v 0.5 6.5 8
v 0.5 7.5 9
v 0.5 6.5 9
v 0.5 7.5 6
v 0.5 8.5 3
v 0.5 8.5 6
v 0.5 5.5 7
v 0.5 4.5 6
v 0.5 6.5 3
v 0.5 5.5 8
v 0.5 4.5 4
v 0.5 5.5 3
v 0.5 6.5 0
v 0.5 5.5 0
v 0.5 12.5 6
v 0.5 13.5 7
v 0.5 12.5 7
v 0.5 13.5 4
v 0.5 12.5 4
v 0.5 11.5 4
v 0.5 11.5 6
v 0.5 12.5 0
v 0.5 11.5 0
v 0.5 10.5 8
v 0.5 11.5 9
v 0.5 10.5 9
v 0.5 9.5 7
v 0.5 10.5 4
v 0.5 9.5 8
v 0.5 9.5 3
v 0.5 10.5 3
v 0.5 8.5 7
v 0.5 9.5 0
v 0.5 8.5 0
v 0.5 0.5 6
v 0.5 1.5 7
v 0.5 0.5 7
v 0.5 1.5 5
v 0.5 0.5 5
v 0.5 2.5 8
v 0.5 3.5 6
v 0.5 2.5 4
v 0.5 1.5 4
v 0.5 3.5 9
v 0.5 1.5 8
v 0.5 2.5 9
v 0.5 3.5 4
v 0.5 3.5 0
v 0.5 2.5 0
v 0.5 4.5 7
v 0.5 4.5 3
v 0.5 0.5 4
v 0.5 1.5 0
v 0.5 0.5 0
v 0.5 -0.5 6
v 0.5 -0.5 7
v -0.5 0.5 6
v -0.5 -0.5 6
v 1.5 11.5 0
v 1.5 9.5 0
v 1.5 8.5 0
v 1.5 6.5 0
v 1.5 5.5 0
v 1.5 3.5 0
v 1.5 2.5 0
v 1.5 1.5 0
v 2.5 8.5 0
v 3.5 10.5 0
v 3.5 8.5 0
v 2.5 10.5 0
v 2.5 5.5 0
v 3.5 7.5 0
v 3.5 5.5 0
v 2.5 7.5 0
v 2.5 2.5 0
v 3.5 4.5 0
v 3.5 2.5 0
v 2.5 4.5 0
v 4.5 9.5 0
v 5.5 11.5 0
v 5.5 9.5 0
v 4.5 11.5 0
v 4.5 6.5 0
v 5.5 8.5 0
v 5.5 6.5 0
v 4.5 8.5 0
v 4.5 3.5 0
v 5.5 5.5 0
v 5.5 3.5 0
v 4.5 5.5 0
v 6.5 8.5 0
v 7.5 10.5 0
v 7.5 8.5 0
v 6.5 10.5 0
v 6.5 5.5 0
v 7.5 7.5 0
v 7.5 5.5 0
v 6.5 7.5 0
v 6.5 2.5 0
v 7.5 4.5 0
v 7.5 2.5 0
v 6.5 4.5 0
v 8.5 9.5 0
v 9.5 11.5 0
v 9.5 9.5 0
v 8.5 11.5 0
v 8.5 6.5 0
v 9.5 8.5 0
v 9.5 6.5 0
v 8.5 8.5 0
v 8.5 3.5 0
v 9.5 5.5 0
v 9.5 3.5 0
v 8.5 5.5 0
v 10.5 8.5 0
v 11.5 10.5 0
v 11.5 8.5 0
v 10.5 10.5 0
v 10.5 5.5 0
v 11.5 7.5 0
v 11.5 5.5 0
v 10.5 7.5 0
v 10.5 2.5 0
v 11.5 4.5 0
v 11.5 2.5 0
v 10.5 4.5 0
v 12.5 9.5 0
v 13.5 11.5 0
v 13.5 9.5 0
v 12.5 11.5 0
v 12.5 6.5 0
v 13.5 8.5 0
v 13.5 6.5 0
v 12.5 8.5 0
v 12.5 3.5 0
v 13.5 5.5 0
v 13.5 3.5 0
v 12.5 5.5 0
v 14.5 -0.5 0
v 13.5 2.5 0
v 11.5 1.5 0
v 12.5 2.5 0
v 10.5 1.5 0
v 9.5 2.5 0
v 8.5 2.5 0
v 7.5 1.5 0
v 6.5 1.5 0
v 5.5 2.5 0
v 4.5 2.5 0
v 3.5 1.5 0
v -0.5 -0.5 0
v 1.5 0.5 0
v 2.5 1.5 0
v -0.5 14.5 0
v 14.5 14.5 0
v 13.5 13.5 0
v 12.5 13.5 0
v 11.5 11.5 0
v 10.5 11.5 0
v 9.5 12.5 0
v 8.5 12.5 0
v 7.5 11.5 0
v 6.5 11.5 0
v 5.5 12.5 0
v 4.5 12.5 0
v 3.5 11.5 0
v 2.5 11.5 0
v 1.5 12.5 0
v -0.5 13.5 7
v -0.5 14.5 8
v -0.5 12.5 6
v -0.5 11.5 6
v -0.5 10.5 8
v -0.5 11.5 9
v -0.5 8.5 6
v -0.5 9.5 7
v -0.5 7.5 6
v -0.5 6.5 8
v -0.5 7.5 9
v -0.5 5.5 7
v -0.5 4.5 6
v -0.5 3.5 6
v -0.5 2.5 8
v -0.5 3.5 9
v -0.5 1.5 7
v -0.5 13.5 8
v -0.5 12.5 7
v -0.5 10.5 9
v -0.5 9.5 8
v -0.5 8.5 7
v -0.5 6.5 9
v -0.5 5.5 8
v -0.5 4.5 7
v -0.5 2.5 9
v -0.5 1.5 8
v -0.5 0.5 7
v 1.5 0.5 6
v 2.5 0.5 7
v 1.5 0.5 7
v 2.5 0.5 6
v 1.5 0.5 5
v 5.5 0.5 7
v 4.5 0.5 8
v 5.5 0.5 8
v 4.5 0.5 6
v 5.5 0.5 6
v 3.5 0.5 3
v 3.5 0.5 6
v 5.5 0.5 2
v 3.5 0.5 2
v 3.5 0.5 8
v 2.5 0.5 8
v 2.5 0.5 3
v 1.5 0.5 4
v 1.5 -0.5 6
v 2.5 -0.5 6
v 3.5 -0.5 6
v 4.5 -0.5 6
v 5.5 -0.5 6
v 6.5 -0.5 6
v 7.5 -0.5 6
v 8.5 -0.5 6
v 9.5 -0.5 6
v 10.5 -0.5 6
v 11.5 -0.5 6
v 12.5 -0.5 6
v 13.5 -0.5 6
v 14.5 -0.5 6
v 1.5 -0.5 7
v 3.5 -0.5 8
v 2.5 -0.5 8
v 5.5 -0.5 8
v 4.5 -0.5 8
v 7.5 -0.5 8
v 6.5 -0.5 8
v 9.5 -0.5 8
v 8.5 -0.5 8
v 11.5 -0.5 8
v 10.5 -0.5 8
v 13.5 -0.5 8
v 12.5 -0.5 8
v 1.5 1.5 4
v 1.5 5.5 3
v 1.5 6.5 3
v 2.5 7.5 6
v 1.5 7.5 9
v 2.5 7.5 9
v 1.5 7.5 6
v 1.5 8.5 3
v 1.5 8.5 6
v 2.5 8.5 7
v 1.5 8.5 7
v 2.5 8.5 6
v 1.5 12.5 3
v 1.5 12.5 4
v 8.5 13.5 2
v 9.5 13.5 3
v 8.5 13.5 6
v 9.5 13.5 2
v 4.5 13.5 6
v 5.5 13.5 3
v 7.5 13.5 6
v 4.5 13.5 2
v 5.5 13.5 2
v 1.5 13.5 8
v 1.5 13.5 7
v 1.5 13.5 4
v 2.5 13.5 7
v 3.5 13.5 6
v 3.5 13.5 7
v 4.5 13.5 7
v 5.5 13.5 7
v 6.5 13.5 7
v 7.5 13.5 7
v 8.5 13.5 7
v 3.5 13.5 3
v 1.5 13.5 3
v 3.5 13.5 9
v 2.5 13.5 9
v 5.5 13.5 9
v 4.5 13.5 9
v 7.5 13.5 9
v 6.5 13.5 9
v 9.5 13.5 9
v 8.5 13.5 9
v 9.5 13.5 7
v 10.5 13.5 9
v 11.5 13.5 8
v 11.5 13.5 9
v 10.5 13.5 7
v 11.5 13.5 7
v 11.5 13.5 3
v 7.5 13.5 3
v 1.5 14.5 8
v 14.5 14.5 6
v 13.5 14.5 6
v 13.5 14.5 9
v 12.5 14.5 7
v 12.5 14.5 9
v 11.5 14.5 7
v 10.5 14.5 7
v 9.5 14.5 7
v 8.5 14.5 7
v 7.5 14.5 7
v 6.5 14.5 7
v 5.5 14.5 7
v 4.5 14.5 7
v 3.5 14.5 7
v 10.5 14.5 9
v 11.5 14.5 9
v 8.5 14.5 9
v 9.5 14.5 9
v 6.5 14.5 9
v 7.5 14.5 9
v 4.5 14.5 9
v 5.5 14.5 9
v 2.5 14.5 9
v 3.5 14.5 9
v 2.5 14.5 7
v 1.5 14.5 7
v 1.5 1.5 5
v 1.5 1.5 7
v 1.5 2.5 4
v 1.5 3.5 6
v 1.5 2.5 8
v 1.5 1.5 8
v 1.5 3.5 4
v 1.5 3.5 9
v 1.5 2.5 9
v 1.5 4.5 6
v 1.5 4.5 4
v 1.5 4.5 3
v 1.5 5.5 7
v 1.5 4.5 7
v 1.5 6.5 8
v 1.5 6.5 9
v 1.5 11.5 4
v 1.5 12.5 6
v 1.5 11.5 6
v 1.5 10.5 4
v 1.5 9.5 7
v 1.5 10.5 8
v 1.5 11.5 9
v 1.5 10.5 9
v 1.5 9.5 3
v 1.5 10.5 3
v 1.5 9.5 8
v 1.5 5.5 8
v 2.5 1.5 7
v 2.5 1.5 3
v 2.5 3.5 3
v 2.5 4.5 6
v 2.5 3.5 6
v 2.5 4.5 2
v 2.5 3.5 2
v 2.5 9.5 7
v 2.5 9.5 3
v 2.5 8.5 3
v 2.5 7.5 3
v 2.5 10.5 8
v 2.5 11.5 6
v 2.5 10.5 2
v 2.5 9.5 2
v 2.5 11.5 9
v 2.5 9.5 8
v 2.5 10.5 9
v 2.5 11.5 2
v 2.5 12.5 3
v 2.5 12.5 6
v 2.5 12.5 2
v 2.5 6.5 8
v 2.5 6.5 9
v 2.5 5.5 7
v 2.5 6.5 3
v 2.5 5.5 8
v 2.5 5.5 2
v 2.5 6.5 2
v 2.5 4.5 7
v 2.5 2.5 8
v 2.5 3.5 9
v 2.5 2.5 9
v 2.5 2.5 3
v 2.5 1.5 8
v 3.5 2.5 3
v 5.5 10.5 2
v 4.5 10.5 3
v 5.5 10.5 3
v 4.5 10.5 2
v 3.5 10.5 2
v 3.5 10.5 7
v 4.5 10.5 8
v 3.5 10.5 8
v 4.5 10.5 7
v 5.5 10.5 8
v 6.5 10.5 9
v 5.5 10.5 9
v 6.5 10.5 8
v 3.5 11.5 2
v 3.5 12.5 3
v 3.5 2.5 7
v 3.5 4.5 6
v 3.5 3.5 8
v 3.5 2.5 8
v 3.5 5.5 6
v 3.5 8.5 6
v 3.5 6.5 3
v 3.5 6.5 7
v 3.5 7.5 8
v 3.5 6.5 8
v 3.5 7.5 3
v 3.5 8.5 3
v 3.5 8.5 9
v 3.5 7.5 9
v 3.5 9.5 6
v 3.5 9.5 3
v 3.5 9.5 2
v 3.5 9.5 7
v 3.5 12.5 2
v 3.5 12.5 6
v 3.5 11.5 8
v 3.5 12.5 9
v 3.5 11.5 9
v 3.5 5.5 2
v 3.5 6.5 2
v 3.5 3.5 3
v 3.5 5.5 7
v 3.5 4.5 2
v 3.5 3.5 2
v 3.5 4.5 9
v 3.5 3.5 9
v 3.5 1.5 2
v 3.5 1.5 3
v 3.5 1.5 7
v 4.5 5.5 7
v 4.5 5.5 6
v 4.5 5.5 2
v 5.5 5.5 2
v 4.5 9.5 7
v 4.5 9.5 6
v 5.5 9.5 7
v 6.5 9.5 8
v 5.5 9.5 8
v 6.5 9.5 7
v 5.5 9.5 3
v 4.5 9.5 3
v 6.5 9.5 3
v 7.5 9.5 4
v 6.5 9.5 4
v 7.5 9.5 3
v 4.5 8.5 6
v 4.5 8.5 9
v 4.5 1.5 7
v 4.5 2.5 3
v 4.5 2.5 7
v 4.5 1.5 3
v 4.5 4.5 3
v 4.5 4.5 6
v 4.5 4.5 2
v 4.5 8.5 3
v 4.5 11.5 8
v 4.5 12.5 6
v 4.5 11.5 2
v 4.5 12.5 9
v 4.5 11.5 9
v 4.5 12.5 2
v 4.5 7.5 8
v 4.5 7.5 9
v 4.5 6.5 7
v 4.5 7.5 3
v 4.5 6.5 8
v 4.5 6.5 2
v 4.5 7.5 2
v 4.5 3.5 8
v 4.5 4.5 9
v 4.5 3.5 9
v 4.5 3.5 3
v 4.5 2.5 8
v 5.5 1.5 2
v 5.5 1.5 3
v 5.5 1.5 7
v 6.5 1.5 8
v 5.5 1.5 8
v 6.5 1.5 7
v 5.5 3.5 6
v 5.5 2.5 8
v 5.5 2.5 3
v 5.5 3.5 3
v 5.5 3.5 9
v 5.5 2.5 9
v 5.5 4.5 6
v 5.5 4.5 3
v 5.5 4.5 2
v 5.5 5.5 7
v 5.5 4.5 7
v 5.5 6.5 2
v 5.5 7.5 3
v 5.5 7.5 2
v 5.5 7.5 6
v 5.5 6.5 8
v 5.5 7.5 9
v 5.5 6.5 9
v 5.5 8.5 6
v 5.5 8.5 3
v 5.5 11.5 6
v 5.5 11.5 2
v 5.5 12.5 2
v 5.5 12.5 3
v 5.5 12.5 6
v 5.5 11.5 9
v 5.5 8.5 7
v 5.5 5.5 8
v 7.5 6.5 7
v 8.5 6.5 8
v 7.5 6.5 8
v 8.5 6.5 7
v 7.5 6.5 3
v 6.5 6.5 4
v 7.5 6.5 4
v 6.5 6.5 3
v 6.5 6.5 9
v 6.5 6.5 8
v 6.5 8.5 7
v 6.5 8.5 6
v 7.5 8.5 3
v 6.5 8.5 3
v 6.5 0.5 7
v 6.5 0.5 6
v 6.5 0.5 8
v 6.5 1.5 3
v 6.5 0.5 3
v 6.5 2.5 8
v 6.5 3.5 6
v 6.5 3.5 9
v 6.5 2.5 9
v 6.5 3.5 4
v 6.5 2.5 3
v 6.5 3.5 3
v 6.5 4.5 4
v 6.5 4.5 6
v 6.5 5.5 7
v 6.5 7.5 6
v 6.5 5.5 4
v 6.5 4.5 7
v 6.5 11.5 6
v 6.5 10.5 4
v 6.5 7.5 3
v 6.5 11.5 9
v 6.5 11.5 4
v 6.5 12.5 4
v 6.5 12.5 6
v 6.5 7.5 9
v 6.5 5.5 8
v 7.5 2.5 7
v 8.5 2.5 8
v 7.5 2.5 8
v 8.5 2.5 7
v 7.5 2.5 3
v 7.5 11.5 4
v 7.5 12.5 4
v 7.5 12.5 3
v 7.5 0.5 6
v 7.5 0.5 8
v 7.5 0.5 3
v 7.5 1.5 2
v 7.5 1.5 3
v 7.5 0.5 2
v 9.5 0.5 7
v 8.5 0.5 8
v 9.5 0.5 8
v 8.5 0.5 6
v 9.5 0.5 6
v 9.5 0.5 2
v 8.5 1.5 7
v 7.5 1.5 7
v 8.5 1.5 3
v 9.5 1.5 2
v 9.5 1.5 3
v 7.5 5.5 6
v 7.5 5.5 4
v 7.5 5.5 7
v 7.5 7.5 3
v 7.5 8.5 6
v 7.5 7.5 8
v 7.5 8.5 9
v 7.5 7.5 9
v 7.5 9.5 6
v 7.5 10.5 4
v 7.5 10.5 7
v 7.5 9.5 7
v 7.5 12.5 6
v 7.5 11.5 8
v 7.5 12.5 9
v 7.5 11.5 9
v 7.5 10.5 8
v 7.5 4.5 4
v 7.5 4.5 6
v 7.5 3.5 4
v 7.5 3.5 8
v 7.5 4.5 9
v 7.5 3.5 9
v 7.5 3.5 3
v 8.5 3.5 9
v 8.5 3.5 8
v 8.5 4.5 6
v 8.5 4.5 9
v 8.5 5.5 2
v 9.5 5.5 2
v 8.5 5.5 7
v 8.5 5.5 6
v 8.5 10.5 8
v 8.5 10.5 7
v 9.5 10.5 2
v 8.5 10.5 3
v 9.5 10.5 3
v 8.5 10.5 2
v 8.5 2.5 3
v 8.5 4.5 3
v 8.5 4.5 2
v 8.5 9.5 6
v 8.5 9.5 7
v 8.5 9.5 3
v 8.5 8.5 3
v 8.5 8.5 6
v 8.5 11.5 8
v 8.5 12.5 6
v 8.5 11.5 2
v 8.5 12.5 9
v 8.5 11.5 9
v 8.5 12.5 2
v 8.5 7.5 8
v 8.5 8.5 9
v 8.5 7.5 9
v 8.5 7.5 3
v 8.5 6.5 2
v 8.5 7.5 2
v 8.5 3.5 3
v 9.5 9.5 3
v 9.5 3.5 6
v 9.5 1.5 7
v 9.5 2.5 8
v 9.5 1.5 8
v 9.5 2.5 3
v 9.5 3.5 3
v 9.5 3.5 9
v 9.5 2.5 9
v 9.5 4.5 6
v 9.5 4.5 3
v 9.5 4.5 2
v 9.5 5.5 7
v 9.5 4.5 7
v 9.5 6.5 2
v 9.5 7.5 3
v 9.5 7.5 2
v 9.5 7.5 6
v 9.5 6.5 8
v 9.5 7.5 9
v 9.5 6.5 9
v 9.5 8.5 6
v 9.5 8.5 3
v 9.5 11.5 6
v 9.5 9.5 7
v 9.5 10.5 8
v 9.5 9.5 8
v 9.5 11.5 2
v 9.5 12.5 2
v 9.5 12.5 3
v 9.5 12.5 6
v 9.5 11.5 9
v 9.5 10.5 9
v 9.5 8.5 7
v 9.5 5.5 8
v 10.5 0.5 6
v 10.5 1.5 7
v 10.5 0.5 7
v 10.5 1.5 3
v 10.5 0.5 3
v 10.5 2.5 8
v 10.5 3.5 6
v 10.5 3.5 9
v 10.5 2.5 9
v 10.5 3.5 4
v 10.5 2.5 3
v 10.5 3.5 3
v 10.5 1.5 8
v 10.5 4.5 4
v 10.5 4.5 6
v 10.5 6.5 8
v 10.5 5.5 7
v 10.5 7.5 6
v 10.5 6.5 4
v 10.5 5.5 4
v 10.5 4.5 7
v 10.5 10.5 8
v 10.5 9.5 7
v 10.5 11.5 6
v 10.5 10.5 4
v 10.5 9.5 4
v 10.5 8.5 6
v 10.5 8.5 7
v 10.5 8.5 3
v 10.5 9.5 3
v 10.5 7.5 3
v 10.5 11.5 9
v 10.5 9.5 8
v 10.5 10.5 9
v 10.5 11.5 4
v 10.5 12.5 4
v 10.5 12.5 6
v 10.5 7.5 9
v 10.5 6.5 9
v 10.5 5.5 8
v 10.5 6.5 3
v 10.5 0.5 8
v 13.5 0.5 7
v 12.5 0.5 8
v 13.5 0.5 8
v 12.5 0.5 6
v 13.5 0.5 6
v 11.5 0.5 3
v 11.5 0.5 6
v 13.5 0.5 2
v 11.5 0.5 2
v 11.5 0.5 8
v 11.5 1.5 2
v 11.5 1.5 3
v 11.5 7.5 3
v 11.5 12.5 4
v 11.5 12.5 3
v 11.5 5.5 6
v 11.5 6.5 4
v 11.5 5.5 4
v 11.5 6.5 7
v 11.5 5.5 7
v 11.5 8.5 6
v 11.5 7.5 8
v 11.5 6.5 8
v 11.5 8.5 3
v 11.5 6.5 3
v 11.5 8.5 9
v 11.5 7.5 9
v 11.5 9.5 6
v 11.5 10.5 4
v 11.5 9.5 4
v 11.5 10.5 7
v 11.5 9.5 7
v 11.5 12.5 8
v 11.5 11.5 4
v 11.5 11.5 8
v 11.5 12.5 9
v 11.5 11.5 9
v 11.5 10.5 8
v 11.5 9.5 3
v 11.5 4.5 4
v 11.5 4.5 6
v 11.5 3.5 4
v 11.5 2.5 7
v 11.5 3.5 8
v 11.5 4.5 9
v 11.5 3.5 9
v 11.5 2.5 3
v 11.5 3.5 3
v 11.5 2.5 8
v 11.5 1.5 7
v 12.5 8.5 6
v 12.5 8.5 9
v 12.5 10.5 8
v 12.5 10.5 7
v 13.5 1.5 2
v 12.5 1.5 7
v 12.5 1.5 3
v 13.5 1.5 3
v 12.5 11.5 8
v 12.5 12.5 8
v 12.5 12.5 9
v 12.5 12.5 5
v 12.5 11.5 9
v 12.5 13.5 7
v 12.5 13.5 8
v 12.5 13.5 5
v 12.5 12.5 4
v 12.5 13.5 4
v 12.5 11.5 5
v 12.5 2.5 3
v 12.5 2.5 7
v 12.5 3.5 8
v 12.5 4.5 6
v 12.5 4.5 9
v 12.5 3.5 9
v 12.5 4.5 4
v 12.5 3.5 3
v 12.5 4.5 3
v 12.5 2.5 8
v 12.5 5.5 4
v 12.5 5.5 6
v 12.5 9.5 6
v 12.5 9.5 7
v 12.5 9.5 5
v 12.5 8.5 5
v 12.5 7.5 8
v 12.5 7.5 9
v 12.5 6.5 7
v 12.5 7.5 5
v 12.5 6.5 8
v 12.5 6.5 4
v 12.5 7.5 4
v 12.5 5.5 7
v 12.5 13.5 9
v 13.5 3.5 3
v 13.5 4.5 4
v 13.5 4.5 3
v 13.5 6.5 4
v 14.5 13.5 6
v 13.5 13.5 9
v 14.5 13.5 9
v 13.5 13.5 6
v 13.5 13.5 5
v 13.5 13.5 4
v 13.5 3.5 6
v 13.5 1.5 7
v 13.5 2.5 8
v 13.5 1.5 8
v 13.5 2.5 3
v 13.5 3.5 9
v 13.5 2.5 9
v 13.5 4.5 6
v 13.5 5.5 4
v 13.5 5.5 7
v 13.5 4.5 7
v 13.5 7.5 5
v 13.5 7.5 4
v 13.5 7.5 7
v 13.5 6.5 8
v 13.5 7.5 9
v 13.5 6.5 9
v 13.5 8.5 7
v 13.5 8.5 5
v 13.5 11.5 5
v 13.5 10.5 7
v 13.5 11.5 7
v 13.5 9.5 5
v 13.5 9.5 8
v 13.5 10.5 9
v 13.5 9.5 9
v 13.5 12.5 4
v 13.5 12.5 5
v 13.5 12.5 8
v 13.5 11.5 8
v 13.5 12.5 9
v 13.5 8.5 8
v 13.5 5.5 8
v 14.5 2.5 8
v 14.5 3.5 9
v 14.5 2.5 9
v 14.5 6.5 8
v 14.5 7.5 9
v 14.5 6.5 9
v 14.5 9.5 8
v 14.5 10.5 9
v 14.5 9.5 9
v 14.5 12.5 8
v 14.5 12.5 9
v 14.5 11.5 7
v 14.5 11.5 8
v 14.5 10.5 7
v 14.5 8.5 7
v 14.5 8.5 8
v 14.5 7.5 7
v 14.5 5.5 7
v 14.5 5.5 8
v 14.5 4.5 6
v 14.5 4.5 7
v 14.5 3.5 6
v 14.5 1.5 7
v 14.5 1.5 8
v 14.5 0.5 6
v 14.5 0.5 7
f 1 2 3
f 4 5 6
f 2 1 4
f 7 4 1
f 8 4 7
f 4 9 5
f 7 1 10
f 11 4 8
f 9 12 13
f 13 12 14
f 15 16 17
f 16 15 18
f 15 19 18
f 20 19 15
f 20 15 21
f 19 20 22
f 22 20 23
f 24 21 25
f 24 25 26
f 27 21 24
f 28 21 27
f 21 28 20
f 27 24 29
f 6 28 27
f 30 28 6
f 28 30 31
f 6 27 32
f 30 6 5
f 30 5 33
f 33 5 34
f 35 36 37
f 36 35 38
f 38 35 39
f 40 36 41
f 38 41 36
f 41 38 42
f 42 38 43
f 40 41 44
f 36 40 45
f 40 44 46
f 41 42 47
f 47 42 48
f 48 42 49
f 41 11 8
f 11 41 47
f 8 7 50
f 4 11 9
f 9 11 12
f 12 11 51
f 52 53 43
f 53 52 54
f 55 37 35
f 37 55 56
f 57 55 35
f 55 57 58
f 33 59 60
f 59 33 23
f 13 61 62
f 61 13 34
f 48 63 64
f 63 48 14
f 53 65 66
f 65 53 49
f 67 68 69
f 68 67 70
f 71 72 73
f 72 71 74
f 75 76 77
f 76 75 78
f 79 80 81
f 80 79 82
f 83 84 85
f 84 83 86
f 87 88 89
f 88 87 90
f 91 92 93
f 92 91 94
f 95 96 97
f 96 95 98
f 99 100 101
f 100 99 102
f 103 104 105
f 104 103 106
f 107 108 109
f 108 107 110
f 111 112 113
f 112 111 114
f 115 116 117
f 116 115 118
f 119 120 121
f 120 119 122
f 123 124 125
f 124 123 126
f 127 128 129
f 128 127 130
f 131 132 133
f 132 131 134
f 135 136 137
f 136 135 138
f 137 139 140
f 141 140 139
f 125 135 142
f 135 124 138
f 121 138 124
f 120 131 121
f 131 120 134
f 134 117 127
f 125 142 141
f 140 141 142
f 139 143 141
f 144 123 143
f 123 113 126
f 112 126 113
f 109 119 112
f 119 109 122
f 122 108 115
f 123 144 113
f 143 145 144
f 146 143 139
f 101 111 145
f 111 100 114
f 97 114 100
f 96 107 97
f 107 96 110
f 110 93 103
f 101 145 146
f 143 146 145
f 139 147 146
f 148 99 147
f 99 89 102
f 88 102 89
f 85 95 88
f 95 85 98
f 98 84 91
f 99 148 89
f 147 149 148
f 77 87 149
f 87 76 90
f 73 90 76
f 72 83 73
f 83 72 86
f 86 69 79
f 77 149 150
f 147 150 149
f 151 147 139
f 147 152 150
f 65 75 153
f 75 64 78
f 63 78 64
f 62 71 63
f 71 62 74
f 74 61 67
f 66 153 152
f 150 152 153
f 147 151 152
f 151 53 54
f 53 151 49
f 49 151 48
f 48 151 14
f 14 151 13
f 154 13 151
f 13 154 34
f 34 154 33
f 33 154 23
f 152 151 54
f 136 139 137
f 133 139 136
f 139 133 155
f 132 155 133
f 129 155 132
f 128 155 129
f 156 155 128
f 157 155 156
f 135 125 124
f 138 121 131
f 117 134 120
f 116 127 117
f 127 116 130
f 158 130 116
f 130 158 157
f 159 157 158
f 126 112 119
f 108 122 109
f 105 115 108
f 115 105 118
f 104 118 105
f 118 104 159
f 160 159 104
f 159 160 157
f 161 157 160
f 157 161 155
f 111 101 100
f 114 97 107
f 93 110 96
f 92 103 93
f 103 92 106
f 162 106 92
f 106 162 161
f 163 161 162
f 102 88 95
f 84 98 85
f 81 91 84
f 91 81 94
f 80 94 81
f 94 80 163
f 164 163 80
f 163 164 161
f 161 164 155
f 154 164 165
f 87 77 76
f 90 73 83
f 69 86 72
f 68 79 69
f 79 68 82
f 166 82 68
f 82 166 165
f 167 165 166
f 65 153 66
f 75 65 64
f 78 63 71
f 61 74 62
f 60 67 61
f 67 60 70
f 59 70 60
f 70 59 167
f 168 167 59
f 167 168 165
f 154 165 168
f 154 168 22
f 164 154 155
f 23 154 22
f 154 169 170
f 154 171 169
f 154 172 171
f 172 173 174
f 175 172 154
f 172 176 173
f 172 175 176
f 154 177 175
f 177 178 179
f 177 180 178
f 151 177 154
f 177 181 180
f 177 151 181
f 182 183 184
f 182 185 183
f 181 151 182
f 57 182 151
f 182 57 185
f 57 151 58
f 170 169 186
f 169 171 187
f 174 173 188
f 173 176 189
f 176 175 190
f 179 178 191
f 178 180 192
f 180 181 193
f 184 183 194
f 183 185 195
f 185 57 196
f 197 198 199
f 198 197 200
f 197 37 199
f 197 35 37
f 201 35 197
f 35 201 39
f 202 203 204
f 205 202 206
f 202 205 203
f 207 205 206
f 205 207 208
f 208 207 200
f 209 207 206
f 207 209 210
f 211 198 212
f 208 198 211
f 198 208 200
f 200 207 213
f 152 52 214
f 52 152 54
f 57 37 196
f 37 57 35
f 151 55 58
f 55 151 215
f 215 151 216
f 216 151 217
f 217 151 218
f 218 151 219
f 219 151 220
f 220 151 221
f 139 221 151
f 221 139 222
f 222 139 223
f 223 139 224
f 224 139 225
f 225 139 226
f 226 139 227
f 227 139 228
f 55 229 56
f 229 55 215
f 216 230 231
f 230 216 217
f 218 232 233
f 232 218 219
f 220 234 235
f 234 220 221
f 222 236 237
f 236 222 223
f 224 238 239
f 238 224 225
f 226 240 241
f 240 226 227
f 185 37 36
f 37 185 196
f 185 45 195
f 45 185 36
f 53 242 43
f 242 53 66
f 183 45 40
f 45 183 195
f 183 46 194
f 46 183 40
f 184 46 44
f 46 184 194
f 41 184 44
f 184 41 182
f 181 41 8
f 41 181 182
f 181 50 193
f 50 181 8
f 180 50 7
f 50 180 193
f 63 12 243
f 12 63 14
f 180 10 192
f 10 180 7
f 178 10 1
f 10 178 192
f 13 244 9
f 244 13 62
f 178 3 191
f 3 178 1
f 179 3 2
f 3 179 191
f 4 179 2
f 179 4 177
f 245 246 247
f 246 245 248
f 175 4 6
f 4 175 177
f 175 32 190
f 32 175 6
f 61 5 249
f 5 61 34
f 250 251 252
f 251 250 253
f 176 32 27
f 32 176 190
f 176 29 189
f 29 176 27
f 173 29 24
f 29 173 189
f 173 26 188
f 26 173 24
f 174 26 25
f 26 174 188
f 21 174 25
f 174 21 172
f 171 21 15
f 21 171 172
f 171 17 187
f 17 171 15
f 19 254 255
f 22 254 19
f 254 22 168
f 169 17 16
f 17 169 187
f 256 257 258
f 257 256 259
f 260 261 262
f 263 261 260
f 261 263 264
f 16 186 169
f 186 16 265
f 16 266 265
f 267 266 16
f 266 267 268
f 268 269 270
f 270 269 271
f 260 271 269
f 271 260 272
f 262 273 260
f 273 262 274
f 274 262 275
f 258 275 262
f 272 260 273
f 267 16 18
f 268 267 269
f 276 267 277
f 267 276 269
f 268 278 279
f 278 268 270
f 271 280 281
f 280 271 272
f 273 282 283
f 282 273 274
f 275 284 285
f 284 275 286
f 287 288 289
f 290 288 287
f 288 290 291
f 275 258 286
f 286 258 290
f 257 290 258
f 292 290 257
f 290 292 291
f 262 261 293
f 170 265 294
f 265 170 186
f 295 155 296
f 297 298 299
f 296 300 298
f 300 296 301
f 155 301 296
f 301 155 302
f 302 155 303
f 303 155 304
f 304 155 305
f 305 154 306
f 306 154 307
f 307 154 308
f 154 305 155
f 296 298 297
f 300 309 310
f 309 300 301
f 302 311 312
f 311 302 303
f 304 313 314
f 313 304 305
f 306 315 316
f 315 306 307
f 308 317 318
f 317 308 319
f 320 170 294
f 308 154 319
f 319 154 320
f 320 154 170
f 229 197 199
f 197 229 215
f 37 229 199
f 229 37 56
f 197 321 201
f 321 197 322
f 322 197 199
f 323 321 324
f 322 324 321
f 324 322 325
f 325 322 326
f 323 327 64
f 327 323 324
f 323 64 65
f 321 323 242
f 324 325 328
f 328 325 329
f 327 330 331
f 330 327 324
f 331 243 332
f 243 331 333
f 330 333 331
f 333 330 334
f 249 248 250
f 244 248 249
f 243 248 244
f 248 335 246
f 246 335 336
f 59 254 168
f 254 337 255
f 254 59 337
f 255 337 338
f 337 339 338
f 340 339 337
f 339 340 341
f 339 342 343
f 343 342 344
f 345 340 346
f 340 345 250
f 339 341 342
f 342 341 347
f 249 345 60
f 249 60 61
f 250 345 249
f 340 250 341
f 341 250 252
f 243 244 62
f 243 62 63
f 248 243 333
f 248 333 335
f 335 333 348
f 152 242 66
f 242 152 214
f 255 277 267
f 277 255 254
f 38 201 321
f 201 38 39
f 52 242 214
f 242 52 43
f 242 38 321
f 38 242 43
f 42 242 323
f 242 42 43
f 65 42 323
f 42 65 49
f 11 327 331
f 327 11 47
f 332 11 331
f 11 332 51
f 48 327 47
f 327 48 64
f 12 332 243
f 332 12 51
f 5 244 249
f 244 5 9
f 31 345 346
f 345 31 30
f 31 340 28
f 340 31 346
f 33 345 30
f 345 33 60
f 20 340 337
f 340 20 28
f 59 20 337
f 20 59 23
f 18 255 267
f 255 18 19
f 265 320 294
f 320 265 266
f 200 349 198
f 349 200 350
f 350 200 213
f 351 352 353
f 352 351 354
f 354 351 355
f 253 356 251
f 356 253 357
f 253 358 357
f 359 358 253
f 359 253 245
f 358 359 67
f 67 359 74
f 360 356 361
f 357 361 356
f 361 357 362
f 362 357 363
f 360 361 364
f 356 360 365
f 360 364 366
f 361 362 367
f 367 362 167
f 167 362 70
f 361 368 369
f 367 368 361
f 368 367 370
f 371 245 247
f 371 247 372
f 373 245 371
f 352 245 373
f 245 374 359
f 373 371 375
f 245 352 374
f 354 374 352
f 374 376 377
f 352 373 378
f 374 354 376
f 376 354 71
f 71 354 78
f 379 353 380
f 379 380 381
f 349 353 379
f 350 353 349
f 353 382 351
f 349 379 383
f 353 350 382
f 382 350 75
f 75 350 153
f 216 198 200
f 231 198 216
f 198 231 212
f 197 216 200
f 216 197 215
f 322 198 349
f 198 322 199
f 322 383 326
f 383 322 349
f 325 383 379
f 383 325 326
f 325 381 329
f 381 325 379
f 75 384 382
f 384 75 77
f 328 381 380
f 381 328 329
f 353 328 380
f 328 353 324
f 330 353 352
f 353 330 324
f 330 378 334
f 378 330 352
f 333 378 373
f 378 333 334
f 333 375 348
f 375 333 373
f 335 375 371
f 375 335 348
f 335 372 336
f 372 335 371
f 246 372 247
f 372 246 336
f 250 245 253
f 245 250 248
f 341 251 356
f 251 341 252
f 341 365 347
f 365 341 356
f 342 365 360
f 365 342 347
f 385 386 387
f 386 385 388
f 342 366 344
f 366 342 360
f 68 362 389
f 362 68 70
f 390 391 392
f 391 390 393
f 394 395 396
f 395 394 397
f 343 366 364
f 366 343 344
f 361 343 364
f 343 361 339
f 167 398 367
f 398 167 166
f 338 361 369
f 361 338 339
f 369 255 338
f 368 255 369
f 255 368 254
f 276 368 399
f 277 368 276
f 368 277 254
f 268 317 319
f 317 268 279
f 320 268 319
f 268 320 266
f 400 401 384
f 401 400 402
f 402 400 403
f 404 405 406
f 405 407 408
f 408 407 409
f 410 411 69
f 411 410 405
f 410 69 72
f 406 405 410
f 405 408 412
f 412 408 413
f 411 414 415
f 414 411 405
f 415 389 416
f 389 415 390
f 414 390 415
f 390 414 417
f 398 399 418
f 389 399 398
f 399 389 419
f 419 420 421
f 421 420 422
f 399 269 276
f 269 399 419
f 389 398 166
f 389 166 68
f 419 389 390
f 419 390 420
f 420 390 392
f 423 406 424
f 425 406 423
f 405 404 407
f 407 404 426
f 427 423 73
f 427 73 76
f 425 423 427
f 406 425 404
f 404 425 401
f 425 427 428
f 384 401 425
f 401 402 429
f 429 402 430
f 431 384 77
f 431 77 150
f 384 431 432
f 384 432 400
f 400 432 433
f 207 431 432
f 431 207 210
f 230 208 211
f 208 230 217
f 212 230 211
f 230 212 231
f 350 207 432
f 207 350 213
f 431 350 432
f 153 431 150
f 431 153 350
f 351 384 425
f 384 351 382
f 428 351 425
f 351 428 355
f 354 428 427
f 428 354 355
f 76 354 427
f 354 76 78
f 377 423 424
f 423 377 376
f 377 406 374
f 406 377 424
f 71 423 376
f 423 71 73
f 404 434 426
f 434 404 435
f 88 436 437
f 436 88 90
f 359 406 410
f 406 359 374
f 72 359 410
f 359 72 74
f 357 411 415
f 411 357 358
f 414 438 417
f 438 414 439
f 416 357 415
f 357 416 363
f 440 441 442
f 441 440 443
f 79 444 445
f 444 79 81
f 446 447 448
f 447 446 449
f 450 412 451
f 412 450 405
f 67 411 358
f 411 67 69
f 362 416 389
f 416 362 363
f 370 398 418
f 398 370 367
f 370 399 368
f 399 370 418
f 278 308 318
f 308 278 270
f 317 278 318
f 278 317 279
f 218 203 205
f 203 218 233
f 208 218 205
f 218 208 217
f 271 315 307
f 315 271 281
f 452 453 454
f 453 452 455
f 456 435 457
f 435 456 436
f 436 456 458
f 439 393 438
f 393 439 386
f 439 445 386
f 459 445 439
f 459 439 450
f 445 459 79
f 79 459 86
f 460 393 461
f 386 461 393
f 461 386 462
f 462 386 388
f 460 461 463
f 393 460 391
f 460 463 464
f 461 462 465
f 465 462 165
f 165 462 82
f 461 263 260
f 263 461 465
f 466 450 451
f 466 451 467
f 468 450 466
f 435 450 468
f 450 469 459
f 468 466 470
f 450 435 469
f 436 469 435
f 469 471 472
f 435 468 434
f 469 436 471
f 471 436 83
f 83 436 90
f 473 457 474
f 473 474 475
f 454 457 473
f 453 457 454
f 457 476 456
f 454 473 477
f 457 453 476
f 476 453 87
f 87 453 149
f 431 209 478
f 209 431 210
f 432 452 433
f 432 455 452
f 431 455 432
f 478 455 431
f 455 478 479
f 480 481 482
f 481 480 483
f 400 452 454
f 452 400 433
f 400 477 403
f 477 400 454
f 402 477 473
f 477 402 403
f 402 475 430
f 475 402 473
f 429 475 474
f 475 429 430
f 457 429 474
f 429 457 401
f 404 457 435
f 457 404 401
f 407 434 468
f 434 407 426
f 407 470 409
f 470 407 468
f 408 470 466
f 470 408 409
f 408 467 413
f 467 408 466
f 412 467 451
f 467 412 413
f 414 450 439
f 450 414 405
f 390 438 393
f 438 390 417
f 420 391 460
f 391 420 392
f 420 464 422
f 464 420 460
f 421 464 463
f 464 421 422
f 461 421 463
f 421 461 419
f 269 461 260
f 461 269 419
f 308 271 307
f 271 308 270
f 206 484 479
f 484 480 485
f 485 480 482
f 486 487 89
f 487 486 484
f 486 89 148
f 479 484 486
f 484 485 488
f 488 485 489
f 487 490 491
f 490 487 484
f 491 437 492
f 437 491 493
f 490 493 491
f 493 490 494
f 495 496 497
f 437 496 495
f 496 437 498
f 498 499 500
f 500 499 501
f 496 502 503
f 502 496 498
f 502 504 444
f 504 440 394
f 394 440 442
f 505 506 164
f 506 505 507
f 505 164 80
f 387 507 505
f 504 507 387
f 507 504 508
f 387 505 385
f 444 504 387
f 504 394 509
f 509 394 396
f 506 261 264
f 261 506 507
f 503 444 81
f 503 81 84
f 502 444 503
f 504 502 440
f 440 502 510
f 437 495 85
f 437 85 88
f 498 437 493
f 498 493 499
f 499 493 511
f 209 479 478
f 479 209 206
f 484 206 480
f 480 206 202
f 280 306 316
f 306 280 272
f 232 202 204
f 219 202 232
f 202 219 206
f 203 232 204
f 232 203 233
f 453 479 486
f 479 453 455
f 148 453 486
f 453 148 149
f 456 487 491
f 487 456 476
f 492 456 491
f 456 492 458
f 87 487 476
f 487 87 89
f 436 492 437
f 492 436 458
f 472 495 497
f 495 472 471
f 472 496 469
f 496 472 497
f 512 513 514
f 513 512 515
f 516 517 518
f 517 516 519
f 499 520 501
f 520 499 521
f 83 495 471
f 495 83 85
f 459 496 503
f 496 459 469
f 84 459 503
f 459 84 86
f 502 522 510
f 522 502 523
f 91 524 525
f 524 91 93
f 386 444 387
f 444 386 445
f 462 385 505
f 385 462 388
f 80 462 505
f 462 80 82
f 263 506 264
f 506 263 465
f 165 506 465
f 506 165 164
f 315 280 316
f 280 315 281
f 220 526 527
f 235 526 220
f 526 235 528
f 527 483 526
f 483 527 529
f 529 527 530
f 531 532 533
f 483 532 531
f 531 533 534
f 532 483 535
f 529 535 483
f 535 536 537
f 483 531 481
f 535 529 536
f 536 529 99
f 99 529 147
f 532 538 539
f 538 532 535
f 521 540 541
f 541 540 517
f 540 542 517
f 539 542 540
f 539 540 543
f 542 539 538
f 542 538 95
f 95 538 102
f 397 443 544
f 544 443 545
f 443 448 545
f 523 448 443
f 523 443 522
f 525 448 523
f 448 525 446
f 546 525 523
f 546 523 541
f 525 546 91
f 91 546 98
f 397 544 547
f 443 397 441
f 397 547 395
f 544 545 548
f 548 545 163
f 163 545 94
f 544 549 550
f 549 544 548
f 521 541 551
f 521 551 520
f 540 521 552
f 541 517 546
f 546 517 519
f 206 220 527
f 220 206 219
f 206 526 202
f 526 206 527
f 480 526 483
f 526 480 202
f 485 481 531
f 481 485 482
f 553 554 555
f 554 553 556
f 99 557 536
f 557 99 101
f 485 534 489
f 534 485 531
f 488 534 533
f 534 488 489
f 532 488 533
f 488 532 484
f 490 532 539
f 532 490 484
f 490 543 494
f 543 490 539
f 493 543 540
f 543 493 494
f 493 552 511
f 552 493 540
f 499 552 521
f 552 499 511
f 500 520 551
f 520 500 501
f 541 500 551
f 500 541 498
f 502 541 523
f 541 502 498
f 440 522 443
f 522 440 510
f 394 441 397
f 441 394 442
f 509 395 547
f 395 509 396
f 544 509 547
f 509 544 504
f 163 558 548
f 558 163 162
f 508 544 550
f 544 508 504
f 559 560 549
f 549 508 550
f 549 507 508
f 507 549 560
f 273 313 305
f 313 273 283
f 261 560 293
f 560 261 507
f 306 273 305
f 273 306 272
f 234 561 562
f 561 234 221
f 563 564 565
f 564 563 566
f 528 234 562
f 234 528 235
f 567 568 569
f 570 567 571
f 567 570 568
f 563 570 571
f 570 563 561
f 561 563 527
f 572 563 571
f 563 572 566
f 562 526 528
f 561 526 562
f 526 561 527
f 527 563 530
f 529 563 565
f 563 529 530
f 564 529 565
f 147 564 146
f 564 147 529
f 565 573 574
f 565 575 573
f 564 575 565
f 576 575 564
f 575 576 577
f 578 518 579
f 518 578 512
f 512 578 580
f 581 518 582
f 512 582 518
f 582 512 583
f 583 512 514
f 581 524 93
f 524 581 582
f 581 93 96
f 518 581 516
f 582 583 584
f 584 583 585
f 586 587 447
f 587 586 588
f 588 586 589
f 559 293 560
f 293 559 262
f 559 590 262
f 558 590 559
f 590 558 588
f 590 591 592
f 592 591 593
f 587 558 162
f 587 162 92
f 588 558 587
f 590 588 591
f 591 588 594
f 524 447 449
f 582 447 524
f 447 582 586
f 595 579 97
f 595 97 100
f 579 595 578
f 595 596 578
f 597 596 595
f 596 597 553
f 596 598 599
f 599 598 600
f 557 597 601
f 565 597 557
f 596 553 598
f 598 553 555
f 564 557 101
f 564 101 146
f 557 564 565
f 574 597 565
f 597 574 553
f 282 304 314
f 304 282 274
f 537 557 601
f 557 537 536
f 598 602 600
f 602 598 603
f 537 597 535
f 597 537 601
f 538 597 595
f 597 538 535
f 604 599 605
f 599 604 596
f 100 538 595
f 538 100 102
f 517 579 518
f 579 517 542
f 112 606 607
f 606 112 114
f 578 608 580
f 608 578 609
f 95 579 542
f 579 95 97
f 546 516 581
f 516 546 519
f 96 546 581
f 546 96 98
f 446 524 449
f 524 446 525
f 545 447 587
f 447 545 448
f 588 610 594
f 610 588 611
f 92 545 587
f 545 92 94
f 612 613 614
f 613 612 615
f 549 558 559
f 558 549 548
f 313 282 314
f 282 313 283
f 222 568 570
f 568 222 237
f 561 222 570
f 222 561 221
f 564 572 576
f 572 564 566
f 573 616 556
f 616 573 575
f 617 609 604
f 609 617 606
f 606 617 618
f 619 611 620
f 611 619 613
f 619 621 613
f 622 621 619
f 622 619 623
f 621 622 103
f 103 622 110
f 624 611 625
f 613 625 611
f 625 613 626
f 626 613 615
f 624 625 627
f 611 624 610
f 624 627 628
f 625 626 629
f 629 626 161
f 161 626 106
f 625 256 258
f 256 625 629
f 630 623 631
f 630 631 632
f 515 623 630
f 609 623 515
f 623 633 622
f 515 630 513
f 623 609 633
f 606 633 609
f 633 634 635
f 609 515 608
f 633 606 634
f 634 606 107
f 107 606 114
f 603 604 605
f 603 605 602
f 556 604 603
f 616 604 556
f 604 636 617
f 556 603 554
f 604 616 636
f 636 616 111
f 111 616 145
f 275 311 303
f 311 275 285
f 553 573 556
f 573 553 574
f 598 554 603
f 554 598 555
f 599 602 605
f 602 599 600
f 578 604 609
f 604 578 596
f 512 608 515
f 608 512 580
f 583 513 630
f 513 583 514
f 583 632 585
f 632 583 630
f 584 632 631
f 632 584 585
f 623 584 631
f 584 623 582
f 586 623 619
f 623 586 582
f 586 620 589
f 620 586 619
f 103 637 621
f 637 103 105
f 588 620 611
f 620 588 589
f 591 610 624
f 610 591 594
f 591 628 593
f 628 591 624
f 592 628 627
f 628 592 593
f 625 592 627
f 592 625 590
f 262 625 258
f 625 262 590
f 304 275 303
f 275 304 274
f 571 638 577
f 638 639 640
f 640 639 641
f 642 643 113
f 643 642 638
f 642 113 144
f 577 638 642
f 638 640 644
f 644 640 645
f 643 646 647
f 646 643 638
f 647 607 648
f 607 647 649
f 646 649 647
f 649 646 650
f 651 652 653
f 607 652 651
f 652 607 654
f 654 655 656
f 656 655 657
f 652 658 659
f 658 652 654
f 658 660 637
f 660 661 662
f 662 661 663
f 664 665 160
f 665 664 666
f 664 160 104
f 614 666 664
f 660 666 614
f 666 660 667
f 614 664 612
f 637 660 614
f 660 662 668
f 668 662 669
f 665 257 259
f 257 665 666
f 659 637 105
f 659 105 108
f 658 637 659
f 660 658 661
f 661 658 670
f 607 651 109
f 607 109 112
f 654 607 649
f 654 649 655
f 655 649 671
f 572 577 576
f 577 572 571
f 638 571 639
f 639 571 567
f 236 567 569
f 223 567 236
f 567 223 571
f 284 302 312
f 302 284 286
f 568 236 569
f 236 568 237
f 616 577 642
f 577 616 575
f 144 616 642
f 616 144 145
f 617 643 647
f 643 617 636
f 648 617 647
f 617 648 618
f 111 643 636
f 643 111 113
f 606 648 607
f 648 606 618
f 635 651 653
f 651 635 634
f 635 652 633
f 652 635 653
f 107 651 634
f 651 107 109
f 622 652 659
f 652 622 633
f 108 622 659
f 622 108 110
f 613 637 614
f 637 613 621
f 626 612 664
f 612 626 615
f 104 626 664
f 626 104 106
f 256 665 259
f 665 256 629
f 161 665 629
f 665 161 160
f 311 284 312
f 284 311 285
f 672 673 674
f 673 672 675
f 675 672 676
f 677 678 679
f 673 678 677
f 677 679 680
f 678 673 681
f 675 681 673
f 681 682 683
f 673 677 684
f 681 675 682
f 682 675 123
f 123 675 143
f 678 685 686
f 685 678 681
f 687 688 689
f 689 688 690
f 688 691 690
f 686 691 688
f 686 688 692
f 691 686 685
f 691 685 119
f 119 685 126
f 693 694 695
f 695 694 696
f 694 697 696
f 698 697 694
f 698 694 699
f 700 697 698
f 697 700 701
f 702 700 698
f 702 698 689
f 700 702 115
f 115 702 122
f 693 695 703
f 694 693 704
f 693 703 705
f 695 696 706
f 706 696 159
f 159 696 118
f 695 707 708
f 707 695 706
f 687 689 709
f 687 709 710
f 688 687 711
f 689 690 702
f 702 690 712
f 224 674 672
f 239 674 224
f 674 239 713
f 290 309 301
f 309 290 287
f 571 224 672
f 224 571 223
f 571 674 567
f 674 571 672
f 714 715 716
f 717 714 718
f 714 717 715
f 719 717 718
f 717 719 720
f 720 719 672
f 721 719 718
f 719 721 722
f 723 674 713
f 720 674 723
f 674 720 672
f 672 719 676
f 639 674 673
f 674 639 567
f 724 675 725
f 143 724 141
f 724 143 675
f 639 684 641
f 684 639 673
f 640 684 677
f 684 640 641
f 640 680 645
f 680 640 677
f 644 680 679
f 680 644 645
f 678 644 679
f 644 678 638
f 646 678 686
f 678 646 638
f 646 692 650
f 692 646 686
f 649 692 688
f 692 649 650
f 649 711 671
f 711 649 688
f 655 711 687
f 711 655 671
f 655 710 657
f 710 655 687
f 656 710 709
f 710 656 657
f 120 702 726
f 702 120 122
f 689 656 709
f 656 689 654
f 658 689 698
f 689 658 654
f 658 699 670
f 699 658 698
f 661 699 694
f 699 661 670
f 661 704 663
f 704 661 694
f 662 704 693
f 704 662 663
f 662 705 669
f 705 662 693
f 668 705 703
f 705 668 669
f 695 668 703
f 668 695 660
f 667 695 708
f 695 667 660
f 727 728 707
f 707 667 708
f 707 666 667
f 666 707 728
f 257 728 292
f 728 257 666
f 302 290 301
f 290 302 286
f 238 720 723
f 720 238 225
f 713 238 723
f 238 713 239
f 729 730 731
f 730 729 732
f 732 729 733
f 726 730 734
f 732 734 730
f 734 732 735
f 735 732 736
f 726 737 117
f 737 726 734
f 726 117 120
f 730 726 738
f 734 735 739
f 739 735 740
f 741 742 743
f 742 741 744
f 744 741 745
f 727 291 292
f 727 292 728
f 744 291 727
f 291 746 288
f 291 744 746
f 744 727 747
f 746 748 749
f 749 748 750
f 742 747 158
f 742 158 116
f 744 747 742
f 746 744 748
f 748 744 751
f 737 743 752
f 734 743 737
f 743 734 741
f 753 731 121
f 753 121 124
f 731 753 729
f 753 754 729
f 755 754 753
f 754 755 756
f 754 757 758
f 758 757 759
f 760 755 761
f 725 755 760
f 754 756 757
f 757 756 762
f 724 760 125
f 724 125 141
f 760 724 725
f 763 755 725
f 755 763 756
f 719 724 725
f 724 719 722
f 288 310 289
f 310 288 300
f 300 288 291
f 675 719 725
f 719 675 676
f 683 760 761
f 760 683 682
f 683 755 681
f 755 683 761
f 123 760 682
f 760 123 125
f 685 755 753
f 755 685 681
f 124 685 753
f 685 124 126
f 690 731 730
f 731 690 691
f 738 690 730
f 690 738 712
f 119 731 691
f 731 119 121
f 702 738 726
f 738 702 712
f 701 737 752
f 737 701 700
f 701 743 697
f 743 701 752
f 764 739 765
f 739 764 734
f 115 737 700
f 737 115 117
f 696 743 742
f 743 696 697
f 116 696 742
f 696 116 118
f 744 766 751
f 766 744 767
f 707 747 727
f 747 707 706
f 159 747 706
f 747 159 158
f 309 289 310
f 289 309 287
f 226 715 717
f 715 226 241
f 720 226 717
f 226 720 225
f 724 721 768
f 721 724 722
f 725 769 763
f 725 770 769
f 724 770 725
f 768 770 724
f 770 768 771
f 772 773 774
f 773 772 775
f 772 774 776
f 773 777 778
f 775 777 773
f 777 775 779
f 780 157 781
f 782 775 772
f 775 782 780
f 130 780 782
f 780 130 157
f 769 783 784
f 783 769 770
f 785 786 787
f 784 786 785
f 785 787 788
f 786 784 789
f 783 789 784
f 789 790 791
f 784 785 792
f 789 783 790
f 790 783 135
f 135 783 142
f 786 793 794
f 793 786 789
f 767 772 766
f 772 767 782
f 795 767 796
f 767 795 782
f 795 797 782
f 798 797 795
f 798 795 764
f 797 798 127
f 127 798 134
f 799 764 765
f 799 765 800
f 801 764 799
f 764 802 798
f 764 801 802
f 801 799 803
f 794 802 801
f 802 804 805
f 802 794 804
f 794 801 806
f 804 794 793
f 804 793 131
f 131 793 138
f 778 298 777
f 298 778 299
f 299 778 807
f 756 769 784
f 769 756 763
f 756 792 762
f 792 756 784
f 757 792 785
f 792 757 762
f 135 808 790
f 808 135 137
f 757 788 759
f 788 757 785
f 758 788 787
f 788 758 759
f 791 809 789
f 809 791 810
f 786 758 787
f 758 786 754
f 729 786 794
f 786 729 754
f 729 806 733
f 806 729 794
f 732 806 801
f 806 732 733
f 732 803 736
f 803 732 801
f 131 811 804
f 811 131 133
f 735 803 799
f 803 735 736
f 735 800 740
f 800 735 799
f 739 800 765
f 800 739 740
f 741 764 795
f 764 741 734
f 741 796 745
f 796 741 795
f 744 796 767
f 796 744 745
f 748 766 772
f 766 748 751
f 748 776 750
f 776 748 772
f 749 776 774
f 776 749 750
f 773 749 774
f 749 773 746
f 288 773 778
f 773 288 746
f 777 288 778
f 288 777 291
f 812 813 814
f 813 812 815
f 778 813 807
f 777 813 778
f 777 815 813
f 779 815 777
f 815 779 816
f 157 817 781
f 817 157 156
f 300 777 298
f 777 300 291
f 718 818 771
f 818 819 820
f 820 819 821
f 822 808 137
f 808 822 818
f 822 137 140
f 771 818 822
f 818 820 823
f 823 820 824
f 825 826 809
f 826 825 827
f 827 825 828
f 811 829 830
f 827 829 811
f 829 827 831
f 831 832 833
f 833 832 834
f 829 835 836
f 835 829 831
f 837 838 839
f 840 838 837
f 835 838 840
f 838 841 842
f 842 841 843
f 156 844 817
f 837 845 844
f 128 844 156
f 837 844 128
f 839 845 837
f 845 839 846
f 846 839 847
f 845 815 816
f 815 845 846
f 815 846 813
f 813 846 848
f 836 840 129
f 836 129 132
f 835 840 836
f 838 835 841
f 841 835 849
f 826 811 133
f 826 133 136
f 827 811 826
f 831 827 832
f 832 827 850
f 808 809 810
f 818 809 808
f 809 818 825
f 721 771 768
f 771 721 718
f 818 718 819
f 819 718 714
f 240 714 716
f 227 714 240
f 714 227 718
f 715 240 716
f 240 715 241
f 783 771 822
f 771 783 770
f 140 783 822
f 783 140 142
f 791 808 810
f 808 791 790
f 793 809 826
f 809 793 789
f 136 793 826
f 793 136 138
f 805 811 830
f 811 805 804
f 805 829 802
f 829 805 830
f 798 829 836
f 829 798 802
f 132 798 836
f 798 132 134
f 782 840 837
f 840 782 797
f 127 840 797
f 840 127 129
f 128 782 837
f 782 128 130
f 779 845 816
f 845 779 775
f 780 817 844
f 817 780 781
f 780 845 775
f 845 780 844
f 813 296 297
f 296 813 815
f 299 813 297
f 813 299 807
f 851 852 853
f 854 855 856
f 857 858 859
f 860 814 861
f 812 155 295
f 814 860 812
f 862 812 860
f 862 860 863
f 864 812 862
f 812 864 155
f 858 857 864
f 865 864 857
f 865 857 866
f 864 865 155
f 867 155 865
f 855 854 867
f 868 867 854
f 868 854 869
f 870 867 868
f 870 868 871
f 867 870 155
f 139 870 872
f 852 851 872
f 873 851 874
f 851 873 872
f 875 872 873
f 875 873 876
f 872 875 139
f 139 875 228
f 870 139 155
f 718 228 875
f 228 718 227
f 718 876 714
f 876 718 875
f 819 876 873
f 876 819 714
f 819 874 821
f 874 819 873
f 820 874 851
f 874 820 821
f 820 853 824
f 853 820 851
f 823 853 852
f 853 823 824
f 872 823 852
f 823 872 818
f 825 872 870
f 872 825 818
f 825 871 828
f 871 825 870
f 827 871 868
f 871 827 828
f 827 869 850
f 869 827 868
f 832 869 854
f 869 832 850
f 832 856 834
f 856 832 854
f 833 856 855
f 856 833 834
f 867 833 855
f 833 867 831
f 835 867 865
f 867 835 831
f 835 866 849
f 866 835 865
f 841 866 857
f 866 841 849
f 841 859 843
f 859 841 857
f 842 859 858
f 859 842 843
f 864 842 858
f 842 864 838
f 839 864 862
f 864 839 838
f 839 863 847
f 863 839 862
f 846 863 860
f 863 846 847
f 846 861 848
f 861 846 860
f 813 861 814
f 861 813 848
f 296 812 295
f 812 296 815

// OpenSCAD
union() {
    translate([0, 0, 3.0]) cube([1, 1, 6], center=true);
    translate([0, 1, 3.5]) cube([1, 1, 7], center=true);
    translate([0, 2, 4.0]) cube([1, 1, 8], center=true);
    translate([0, 3, 4.5]) cube([1, 1, 9], center=true);
    translate([0, 4, 3.0]) cube([1, 1, 6], center=true);
    translate([0, 5, 3.5]) cube([1, 1, 7], center=true);
    translate([0, 6, 4.0]) cube([1, 1, 8], center=true);
    translate([0, 7, 4.5]) cube([1, 1, 9], center=true);
    translate([0, 8, 3.0]) cube([1, 1, 6], center=true);
    translate([0, 9, 3.5]) cube([1, 1, 7], center=true);
    translate([0, 10, 4.0]) cube([1, 1, 8], center=true);
    translate([0, 11, 4.5]) cube([1, 1, 9], center=true);
    translate([0, 12, 3.0]) cube([1, 1, 6], center=true);
    translate([0, 13, 3.5]) cube([1, 1, 7], center=true);
    translate([0, 14, 4.0]) cube([1, 1, 8], center=true);
    translate([1, 0, 3.5]) cube([1, 1, 7], center=true);
    translate([1, 1, 4.5]) color([1, 0, 0]) cube([1, 1, 1], center=true);
    translate([1, 2, 2.0]) cube([1, 1, 4], center=true);
    translate([1, 4, 2.0]) cube([1, 1, 4], center=true);
    translate([1, 5, 1.5]) cube([1, 1, 3], center=true);
    translate([1, 7, 1.5]) cube([1, 1, 3], center=true);
    translate([1, 8, 1.5]) cube([1, 1, 3], center=true);
    translate([1, 10, 1.5]) cube([1, 1, 3], center=true);
    translate([1, 11, 2.0]) cube([1, 1, 4], center=true);
    translate([1, 13, 2.0]) cube([1, 1, 4], center=true);
    translate([1, 14, 4.0]) cube([1, 1, 8], center=true);
    translate([2, 0, 3.0]) cube([1, 1, 6], center=true);
    translate([2, 1, 3.5]) cube([1, 1, 7], center=true);
    translate([2, 2, 4.0]) cube([1, 1, 8], center=true);
    translate([2, 3, 4.5]) cube([1, 1, 9], center=true);
    translate([2, 4, 3.0]) cube([1, 1, 6], center=true);
    translate([2, 5, 3.5]) cube([1, 1, 7], center=true);
    translate([2, 6, 4.0]) cube([1, 1, 8], center=true);
    translate([2, 7, 4.5]) cube([1, 1, 9], center=true);
    translate([2, 8, 3.0]) cube([1, 1, 6], center=true);
    translate([2, 9, 3.5]) cube([1, 1, 7], center=true);
    translate([2, 10, 4.0]) cube([1, 1, 8], center=true);
    translate([2, 11, 4.5]) cube([1, 1, 9], center=true);
    translate([2, 12, 3.0]) cube([1, 1, 6], center=true);
    translate([2, 13, 1.5]) cube([1, 1, 3], center=true);
    translate([2, 14, 3.5]) cube([1, 1, 7], center=true);
    translate([3, 0, 4.0]) cube([1, 1, 8], center=true);
    translate([3, 1, 1.5]) cube([1, 1, 3], center=true);
    translate([3, 3, 1.5]) cube([1, 1, 3], center=true);
    translate([3, 4, 1.0]) cube([1, 1, 2], center=true);
    translate([3, 6, 1.0]) cube([1, 1, 2], center=true);
    translate([3, 7, 1.5]) cube([1, 1, 3], center=true);
    translate([3, 9, 1.5]) cube([1, 1, 3], center=true);
    translate([3, 10, 1.0]) cube([1, 1, 2], center=true);
    translate([3, 12, 1.0]) cube([1, 1, 2], center=true);
    translate([3, 13, 1.5]) cube([1, 1, 3], center=true);
    translate([3, 14, 4.5]) cube([1, 1, 9], center=true);
    translate([4, 0, 3.0]) cube([1, 1, 6], center=true);
    translate([4, 1, 1.0]) cube([1, 1, 2], center=true);
    translate([4, 2, 3.5]) cube([1, 1, 7], center=true);
    translate([4, 3, 4.0]) cube([1, 1, 8], center=true);
    translate([4, 4, 4.5]) cube([1, 1, 9], center=true);
    translate([4, 5, 3.0]) cube([1, 1, 6], center=true);
    translate([4, 6, 3.5]) cube([1, 1, 7], center=true);
    translate([4, 7, 4.0]) cube([1, 1, 8], center=true);
    translate([4, 8, 4.5]) cube([1, 1, 9], center=true);
    translate([4, 9, 3.0]) cube([1, 1, 6], center=true);
    translate([4, 10, 3.5]) cube([1, 1, 7], center=true);
    translate([4, 11, 4.0]) cube([1, 1, 8], center=true);
    translate([4, 12, 4.5]) cube([1, 1, 9], center=true);
    translate([4, 13, 3.0]) cube([1, 1, 6], center=true);
    translate([4, 14, 3.5]) cube([1, 1, 7], center=true);
    translate([5, 0, 4.0]) cube([1, 1, 8], center=true);
    translate([5, 1, 1.0]) cube([1, 1, 2], center=true);
    translate([5, 2, 1.5]) cube([1, 1, 3], center=true);
    translate([5, 4, 1.5]) cube([1, 1, 3], center=true);
    translate([5, 5, 1.0]) cube([1, 1, 2], center=true);
    translate([5, 7, 1.0]) cube([1, 1, 2], center=true);
    translate([5, 8, 1.5]) cube([1, 1, 3], center=true);
    translate([5, 10, 1.5]) cube([1, 1, 3], center=true);
    translate([5, 11, 1.0]) cube([1, 1, 2], center=true);
    translate([5, 13, 1.0]) cube([1, 1, 2], center=true);
    translate([5, 14, 4.5]) cube([1, 1, 9], center=true);
    translate([6, 0, 3.0]) cube([1, 1, 6], center=true);
    translate([6, 1, 3.5]) cube([1, 1, 7], center=true);
    translate([6, 2, 4.0]) cube([1, 1, 8], center=true);
    translate([6, 3, 4.5]) cube([1, 1, 9], center=true);
    translate([6, 4, 3.0]) cube([1, 1, 6], center=true);
    translate([6, 5, 3.5]) cube([1, 1, 7], center=true);
    translate([6, 6, 4.0]) cube([1, 1, 8], center=true);
    translate([6, 7, 4.5]) cube([1, 1, 9], center=true);
    translate([6, 8, 3.0]) cube([1, 1, 6], center=true);
    translate([6, 9, 3.5]) cube([1, 1, 7], center=true);
    translate([6, 10, 4.0]) cube([1, 1, 8], center=true);
    translate([6, 11, 4.5]) cube([1, 1, 9], center=true);
    translate([6, 12, 3.0]) cube([1, 1, 6], center=true);
    translate([6, 13, 1.5]) cube([1, 1, 3], center=true);
    translate([6, 14, 3.5]) cube([1, 1, 7], center=true);
    translate([7, 0, 4.0]) cube([1, 1, 8], center=true);
    translate([7, 1, 1.5]) cube([1, 1, 3], center=true);
    translate([7, 3, 1.5]) cube([1, 1, 3], center=true);
    translate([7, 4, 2.0]) cube([1, 1, 4], center=true);
    translate([7, 6, 2.0]) cube([1, 1, 4], center=true);
    translate([7, 7, 1.5]) cube([1, 1, 3], center=true);
    translate([7, 9, 1.5]) cube([1, 1, 3], center=true);
    translate([7, 10, 2.0]) cube([1, 1, 4], center=true);
    translate([7, 12, 2.0]) cube([1, 1, 4], center=true);
    translate([7, 13, 1.5]) cube([1, 1, 3], center=true);
    translate([7, 14, 4.5]) cube([1, 1, 9], center=true);
    translate([8, 0, 3.0]) cube([1, 1, 6], center=true);
    translate([8, 1, 1.0]) cube([1, 1, 2], center=true);
    translate([8, 2, 3.5]) cube([1, 1, 7], center=true);
    translate([8, 3, 4.0]) cube([1, 1, 8], center=true);
    translate([8, 4, 4.5]) cube([1, 1, 9], center=true);
    translate([8, 5, 3.0]) cube([1, 1, 6], center=true);
    translate([8, 6, 3.5]) cube([1, 1, 7], center=true);
    translate([8, 7, 4.0]) cube([1, 1, 8], center=true);
    translate([8, 8, 4.5]) cube([1, 1, 9], center=true);
    translate([8, 9, 3.0]) cube([1, 1, 6], center=true);
    translate([8, 10, 3.5]) cube([1, 1, 7], center=true);
    translate([8, 11, 4.0]) cube([1, 1, 8], center=true);
    translate([8, 12, 4.5]) cube([1, 1, 9], center=true);
    translate([8, 13, 3.0]) cube([1, 1, 6], center=true);
    translate([8, 14, 3.5]) cube([1, 1, 7], center=true);
    translate([9, 0, 4.0]) cube([1, 1, 8], center=true);
    translate([9, 1, 1.0]) cube([1, 1, 2], center=true);
    translate([9, 2, 1.5]) cube([1, 1, 3], center=true);
    translate([9, 4, 1.5]) cube([1, 1, 3], center=true);
    translate([9, 5, 1.0]) cube([1, 1, 2], center=true);
    translate([9, 7, 1.0]) cube([1, 1, 2], center=true);
    translate([9, 8, 1.5]) cube([1, 1, 3], center=true);
    translate([9, 10, 1.5]) cube([1, 1, 3], center=true);
    translate([9, 11, 1.0]) cube([1, 1, 2], center=true);
    translate([9, 13, 1.0]) cube([1, 1, 2], center=true);
    translate([9, 14, 4.5]) cube([1, 1, 9], center=true);
    translate([10, 0, 3.0]) cube([1, 1, 6], center=true);
    translate([10, 1, 3.5]) cube([1, 1, 7], center=true);
    translate([10, 2, 4.0]) cube([1, 1, 8], center=true);
    translate([10, 3, 4.5]) cube([1, 1, 9], center=true);
    translate([10, 4, 3.0]) cube([1, 1, 6], center=true);
    translate([10, 5, 3.5]) cube([1, 1, 7], center=true);
    translate([10, 6, 4.0]) cube([1, 1, 8], center=true);
    translate([10, 7, 4.5]) cube([1, 1, 9], center=true);
    translate([10, 8, 3.0]) cube([1, 1, 6], center=true);
    translate([10, 9, 3.5]) cube([1, 1, 7], center=true);
    translate([10, 10, 4.0]) cube([1, 1, 8], center=true);
    translate([10, 11, 4.5]) cube([1, 1, 9], center=true);
    translate([10, 12, 3.0]) cube([1, 1, 6], center=true);
    translate([10, 13, 1.5]) cube([1, 1, 3], center=true);
    translate([10, 14, 3.5]) cube([1, 1, 7], center=true);
    translate([11, 0, 4.0]) cube([1, 1, 8], center=true);
    translate([11, 1, 1.5]) cube([1, 1, 3], center=true);
    translate([11, 3, 1.5]) cube([1, 1, 3], center=true);
    translate([11, 4, 2.0]) cube([1, 1, 4], center=true);
    translate([11, 6, 2.0]) cube([1, 1, 4], center=true);
    translate([11, 7, 1.5]) cube([1, 1, 3], center=true);
    translate([11, 9, 1.5]) cube([1, 1, 3], center=true);
    translate([11, 10, 2.0]) cube([1, 1, 4], center=true);
    translate([11, 12, 2.0]) cube([1, 1, 4], center=true);
    translate([11, 13, 1.5]) cube([1, 1, 3], center=true);
    translate([11, 14, 4.5]) cube([1, 1, 9], center=true);
    translate([12, 0, 3.0]) cube([1, 1, 6], center=true);
    translate([12, 1, 1.0]) cube([1, 1, 2], center=true);
    translate([12, 2, 3.5]) cube([1, 1, 7], center=true);
    translate([12, 3, 4.0]) cube([1, 1, 8], center=true);
    translate([12, 4, 4.5]) cube([1, 1, 9], center=true);
    translate([12, 5, 3.0]) cube([1, 1, 6], center=true);
    translate([12, 6, 3.5]) cube([1, 1, 7], center=true);
    translate([12, 7, 4.0]) cube([1, 1, 8], center=true);
    translate([12, 8, 4.5]) cube([1, 1, 9], center=true);
    translate([12, 9, 3.0]) cube([1, 1, 6], center=true);
    translate([12, 10, 3.5]) cube([1, 1, 7], center=true);
    translate([12, 11, 4.0]) cube([1, 1, 8], center=true);
    translate([12, 12, 4.5]) cube([1, 1, 9], center=true);
    translate([12, 13, 4.0]) cube([1, 1, 8], center=true);
    translate([12, 14, 3.5]) cube([1, 1, 7], center=true);
    translate([13, 0, 4.0]) cube([1, 1, 8], center=true);
    translate([13, 1, 1.0]) cube([1, 1, 2], center=true);
    translate([13, 2, 1.5]) cube([1, 1, 3], center=true);
    translate([13, 4, 1.5]) cube([1, 1, 3], center=true);
    translate([13, 5, 2.0]) cube([1, 1, 4], center=true);
    translate([13, 7, 2.0]) cube([1, 1, 4], center=true);
    translate([13, 8, 2.5]) cube([1, 1, 5], center=true);
    translate([13, 10, 2.5]) cube([1, 1, 5], center=true);
    translate([13, 11, 2.5]) cube([1, 1, 5], center=true);
    translate([13, 13, 4.5]) color([0, 0, 1]) cube([1, 1, 1], center=true);
    translate([13, 14, 4.5]) cube([1, 1, 9], center=true);
    translate([14, 0, 3.0]) cube([1, 1, 6], center=true);
    translate([14, 1, 3.5]) cube([1, 1, 7], center=true);
    translate([14, 2, 4.0]) cube([1, 1, 8], center=true);
    translate([14, 3, 4.5]) cube([1, 1, 9], center=true);
    translate([14, 4, 3.0]) cube([1, 1, 6], center=true);
    translate([14, 5, 3.5]) cube([1, 1, 7], center=true);
    translate([14, 6, 4.0]) cube([1, 1, 8], center=true);
    translate([14, 7, 4.5]) cube([1, 1, 9], center=true);
    translate([14, 8, 3.5]) cube([1, 1, 7], center=true);
    translate([14, 9, 4.0]) cube([1, 1, 8], center=true);
    translate([14, 10, 4.5]) cube([1, 1, 9], center=true);
    translate([14, 11, 3.5]) cube([1, 1, 7], center=true);
    translate([14, 12, 4.0]) cube([1, 1, 8], center=true);
    translate([14, 13, 4.5]) cube([1, 1, 9], center=true);
    translate([14, 14, 3.0]) cube([1, 1, 6], center=true);
}
